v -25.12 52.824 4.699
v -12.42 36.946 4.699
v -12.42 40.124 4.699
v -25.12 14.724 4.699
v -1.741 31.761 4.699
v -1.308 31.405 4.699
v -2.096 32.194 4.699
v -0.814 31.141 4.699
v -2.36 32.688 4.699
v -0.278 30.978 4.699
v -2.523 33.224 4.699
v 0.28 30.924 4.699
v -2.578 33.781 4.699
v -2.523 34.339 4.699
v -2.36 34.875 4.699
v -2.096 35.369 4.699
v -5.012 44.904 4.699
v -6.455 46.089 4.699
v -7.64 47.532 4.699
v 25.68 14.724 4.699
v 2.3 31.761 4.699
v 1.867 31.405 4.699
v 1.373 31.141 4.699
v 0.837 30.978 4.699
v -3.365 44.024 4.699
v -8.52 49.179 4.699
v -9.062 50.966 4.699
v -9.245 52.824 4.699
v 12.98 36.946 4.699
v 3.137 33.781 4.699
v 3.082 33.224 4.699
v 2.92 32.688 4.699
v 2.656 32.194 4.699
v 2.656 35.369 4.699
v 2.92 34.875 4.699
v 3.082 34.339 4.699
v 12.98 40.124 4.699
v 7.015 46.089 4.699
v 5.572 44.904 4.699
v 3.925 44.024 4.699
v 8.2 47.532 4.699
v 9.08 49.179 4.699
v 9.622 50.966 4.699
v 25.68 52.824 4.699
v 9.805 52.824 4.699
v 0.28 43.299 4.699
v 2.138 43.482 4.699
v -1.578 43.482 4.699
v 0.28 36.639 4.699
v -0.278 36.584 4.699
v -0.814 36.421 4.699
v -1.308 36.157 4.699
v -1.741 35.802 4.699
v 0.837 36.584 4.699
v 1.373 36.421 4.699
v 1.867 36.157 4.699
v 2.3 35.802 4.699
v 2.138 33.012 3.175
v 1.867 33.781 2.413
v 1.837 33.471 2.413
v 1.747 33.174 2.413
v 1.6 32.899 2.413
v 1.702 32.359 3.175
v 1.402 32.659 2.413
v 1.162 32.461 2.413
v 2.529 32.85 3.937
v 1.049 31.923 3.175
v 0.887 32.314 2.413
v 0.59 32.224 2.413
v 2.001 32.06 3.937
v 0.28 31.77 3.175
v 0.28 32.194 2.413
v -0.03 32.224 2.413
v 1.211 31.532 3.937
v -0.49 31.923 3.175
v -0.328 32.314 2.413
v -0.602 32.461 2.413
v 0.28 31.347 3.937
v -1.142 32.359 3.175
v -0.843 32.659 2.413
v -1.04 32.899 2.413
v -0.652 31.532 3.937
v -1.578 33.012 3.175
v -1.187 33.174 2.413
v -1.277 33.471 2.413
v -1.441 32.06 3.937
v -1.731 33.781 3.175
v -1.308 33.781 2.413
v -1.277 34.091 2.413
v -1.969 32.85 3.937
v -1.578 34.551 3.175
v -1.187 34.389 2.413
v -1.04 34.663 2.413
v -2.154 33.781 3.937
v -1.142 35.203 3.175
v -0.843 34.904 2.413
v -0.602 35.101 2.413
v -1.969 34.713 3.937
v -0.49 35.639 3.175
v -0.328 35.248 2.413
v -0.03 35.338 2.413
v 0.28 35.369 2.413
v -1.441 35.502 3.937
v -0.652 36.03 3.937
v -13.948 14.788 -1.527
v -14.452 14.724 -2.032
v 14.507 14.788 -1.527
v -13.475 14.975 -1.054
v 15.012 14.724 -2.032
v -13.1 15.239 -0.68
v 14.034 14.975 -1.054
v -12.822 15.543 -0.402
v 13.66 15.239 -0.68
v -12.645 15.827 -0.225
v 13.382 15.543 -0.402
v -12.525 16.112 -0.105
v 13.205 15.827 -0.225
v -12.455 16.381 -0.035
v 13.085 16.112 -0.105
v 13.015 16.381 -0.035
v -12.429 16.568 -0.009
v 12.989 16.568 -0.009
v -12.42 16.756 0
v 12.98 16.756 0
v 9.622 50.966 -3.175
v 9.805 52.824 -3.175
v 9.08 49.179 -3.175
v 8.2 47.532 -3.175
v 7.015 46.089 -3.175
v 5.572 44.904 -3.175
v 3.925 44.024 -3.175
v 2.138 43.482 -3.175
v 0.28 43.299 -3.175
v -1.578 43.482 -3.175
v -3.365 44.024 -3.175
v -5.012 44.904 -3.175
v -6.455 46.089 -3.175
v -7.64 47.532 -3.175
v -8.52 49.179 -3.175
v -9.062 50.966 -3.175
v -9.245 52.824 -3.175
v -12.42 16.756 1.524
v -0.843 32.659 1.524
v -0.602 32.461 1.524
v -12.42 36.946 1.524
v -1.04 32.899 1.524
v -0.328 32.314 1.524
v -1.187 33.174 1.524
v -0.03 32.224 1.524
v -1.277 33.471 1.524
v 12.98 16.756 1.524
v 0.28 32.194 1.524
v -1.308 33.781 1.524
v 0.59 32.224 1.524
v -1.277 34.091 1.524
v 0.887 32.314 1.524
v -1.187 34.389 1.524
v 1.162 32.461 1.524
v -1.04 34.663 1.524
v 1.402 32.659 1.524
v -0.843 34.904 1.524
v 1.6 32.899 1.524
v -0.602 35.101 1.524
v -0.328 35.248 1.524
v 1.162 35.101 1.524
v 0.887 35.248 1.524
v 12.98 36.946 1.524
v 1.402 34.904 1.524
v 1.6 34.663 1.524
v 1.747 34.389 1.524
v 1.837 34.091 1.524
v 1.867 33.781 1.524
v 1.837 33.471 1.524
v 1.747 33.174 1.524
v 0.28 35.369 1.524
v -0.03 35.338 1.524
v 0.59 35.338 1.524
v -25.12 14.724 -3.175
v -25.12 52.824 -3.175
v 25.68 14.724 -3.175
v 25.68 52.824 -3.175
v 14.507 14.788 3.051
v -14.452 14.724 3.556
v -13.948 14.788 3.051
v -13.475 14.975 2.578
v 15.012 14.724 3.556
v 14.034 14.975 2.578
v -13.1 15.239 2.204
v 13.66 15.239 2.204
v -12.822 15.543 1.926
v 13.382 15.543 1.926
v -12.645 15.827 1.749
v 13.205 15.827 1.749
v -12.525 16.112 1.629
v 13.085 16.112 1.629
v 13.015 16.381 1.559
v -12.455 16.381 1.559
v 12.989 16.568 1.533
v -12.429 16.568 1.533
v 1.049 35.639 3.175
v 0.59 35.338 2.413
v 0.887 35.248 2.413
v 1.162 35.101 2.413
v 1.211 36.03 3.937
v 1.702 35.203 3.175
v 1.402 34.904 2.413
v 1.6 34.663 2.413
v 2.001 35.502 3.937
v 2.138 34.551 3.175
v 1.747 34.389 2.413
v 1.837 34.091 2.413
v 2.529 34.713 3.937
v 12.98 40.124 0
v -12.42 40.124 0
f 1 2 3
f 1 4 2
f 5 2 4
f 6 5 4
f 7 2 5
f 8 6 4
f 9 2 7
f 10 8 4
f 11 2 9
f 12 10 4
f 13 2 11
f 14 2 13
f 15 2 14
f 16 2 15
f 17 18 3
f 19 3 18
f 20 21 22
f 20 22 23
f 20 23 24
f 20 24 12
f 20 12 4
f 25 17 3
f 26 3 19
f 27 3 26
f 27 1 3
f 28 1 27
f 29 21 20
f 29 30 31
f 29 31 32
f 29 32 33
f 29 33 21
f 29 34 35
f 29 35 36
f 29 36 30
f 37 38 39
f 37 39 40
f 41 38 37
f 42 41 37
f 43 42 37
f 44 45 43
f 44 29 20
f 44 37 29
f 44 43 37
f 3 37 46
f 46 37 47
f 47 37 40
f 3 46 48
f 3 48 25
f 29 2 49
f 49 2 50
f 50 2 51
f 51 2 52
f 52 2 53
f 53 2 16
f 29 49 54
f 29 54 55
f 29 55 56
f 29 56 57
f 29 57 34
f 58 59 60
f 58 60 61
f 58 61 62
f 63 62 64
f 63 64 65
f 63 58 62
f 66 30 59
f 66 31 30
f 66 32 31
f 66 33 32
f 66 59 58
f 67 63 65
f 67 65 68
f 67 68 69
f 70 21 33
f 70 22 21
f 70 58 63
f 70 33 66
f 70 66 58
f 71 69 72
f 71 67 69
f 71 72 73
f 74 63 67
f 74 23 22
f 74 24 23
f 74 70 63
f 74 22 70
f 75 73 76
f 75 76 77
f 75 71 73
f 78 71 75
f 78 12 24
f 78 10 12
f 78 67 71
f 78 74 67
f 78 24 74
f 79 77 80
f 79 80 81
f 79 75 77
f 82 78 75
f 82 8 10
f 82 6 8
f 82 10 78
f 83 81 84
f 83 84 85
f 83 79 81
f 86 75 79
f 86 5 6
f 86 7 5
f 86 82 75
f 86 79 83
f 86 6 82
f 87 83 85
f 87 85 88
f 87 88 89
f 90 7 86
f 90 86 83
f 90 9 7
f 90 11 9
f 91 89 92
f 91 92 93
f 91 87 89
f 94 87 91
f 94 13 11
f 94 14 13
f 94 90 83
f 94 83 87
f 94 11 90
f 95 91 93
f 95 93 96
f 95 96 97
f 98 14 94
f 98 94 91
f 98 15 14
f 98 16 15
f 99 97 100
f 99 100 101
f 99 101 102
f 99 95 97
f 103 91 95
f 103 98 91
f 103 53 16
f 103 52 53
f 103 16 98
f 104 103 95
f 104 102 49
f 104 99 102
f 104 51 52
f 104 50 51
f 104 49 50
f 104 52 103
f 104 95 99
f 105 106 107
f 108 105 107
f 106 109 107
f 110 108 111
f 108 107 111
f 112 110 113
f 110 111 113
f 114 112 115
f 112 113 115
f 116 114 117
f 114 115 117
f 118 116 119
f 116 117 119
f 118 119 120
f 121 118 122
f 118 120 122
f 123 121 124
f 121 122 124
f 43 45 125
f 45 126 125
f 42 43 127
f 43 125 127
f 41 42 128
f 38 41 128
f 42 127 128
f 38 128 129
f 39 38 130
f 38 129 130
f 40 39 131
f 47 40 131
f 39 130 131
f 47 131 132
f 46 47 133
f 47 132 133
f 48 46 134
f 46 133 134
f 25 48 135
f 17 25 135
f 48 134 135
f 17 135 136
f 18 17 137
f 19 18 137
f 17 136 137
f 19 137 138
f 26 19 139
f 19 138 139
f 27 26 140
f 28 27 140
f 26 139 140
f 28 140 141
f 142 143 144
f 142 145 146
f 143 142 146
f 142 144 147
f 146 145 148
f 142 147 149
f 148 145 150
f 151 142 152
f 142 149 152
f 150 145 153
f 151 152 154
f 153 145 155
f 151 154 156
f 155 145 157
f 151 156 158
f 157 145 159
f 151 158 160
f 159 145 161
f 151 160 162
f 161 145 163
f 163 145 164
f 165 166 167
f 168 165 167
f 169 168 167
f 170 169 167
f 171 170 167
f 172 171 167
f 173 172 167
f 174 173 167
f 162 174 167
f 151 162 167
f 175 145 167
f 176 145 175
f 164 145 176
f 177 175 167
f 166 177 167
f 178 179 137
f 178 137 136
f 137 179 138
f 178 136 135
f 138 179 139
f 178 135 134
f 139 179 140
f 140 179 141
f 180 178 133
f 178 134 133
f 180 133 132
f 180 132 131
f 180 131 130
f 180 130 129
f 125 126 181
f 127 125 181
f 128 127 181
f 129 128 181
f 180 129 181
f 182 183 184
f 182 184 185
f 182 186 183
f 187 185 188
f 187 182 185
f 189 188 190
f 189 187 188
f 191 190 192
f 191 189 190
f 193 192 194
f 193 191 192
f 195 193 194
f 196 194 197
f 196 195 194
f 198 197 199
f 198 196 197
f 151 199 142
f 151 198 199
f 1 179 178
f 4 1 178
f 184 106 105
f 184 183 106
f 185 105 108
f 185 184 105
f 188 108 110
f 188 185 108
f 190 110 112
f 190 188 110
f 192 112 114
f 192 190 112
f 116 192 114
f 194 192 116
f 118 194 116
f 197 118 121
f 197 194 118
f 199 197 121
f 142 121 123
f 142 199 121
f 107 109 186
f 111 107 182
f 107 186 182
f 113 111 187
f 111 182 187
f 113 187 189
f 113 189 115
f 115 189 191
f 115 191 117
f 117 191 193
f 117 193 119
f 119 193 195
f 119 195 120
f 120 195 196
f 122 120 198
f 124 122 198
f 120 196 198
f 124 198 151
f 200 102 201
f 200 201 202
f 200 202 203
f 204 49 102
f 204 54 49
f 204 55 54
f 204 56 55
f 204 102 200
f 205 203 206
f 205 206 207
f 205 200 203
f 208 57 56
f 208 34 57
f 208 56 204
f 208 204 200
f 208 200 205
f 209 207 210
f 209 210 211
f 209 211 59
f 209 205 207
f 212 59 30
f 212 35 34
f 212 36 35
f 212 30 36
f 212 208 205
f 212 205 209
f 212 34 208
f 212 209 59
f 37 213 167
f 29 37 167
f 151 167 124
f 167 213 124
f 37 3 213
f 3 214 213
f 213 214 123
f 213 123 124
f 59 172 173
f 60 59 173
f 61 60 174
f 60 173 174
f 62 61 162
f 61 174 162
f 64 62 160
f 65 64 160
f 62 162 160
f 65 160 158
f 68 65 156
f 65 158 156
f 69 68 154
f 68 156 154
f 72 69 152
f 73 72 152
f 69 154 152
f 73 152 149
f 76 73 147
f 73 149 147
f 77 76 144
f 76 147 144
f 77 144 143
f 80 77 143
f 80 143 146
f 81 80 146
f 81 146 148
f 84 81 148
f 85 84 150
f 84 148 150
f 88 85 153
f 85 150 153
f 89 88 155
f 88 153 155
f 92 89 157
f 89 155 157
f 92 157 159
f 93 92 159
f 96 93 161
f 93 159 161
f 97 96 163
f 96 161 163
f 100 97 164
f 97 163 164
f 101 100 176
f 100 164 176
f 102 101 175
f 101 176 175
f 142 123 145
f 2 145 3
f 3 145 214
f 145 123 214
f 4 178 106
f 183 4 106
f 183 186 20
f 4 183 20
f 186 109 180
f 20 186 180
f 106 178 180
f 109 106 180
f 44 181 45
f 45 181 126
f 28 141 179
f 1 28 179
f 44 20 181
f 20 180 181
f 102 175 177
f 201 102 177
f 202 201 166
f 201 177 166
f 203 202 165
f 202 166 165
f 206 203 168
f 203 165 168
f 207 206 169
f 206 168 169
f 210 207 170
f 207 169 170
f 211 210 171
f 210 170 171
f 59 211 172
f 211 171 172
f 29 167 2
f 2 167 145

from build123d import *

# Parameters (mm, degrees)
F0_R     = 1.5875
F1_DEPTH = 3.175
F2_DEPTH = 1.524
F4_DEPTH = 3.175
F5_R     = 2.032
F6_SIZE2 = 1.27
F6_SIZE  = 2.286


with BuildPart() as f1:
    # F0 (on Top) → F1 (new body)
    with BuildSketch(Plane.XY):
        with BuildLine():
            Line((-9.6292242988, 40.124001728), (0.2798453521, 40.124001728))
            Line((0.2798453521, 40.124001728), (10.1889150029, 40.124001728))
            Line((10.1889150029, 40.124001728), (12.9798453521, 40.124001728))
            Line((12.9798453521, 40.124001728), (12.9798453521, 36.9588285685))
            Line((12.9798453521, 36.9588285685), (12.9798453521, 14.724001728))
            Line((12.9798453521, 14.724001728), (25.6798453521, 14.724001728))
            Line((25.6798453521, 14.724001728), (25.6798453521, 52.824001728))
            Line((25.6798453521, 52.824001728), (9.8048453521, 52.824001728))
            ThreePointArc((9.8048453521, 52.824001728), (0.2798453521, 43.299001728), (-9.2451546479, 52.824001728))
            Line((-9.2451546479, 52.824001728), (-25.1201546479, 52.824001728))
            Line((-25.1201546479, 52.824001728), (-25.1201546479, 14.724001728))
            Line((-25.1201546479, 14.724001728), (-12.4201546479, 14.724001728))
            Line((-12.4201546479, 14.724001728), (-12.4201546479, 36.9588285685))
            Line((-12.4201546479, 36.9588285685), (-12.4201546479, 40.124001728))
            Line((-12.4201546479, 40.124001728), (-9.6292242988, 40.124001728))
        make_face()
        Polygon((10.1889150029, 40.124001728), (0.2798453521, 40.124001728), (-9.6292242988, 40.124001728), (-12.4201546479, 40.124001728), (-12.4201546479, 36.9588285685), (-9.5826818713, 36.9588285685), (0.2798453521, 36.9588285685), (12.9798453521, 36.9588285685), (12.9798453521, 40.124001728), align=None)
        Polygon((12.9798453521, 14.724001728), (12.9798453521, 36.9588285685), (0.2798453521, 36.9588285685), (-9.5826818713, 36.9588285685), (-12.4201546479, 36.9588285685), (-12.4201546479, 14.724001728), align=None)
        with Locations((0.2798453521, 33.3929099143)):
            Circle(F0_R, mode=Mode.SUBTRACT)
        with Locations((0.2798453521, 33.3929099143)):
            Circle(F0_R)
    extrude(amount=-F1_DEPTH)

    # F0 (on Top) → F2 (join)
    with BuildSketch(Plane.XY):
        with BuildLine():
            Line((-9.6292242988, 40.124001728), (0.2798453521, 40.124001728))
            Line((0.2798453521, 40.124001728), (10.1889150029, 40.124001728))
            Line((10.1889150029, 40.124001728), (12.9798453521, 40.124001728))
            Line((12.9798453521, 40.124001728), (12.9798453521, 36.9588285685))
            Line((12.9798453521, 36.9588285685), (12.9798453521, 14.724001728))
            Line((12.9798453521, 14.724001728), (25.6798453521, 14.724001728))
            Line((25.6798453521, 14.724001728), (25.6798453521, 52.824001728))
            Line((25.6798453521, 52.824001728), (9.8048453521, 52.824001728))
            ThreePointArc((9.8048453521, 52.824001728), (0.2798453521, 43.299001728), (-9.2451546479, 52.824001728))
            Line((-9.2451546479, 52.824001728), (-25.1201546479, 52.824001728))
            Line((-25.1201546479, 52.824001728), (-25.1201546479, 14.724001728))
            Line((-25.1201546479, 14.724001728), (-12.4201546479, 14.724001728))
            Line((-12.4201546479, 14.724001728), (-12.4201546479, 36.9588285685))
            Line((-12.4201546479, 36.9588285685), (-12.4201546479, 40.124001728))
            Line((-12.4201546479, 40.124001728), (-9.6292242988, 40.124001728))
        make_face()
    extrude(amount=F2_DEPTH)

    # F3 (on face) → F4 (join)
    with BuildSketch(Plane.XY.offset(1.524)):
        with BuildLine():
            Line((-25.1201546479, 14.724001728), (-12.4201546479, 14.724001728))
            Line((-12.4201546479, 14.724001728), (-12.4201546479, 36.9455851614))
            Line((-12.4201546479, 36.9455851614), (-12.4201546479, 40.124001728))
            Line((-12.4201546479, 40.124001728), (0.2798453521, 40.124001728))
            Line((0.2798453521, 40.124001728), (12.9798453521, 40.124001728))
            Line((12.9798453521, 40.124001728), (12.9798453521, 36.9455851614))
            Line((12.9798453521, 36.9455851614), (12.9798453521, 14.724001728))
            Line((12.9798453521, 14.724001728), (25.6798453521, 14.724001728))
            Line((25.6798453521, 14.724001728), (25.6798453521, 52.824001728))
            Line((25.6798453521, 52.824001728), (9.8048453521, 52.824001728))
            ThreePointArc((9.8048453521, 52.824001728), (0.2798453521, 43.299001728), (-9.2451546479, 52.824001728))
            Line((-9.2451546479, 52.824001728), (-25.1201546479, 52.824001728))
            Line((-25.1201546479, 52.824001728), (-25.1201546479, 14.724001728))
        make_face()
        Polygon((-12.4201546479, 36.9455851614), (-12.4201546479, 14.724001728), (12.9798453521, 14.724001728), (12.9798453521, 36.9455851614), (0.2798453521, 36.9455851614), align=None)
        with BuildLine():
            ThreePointArc((1.8673453521, 33.7810702622), (-0.8426866631, 32.6585382471), (0.2798453521, 35.3685702622))
            ThreePointArc((0.2798453521, 35.3685702622), (1.4023773672, 34.9036022773), (1.8673453521, 33.7810702622))
        make_face(mode=Mode.SUBTRACT)
    extrude(amount=F4_DEPTH)

    # F5
    f5_edges = [f1.edges().sort_by_distance(p)[0] for p in [
        (0.279845, 14.724002, 1.524),
        (0.279845, 14.724002, 0),
        (-12.420155, 14.724002, 0.762),
        (12.979845, 14.724002, 0.762),
    ]]
    fillet(f5_edges, radius=F5_R)

    # F6
    f6_edges = [f1.edges().sort_by_distance(p)[0] for p in [
        (0.279845, 32.19357, 4.699),
    ]]
    f6_side = f1.faces().sort_by_distance((0.279845, 32.19357, 3.1115))[0]
    chamfer(f6_edges, length=F6_SIZE, length2=F6_SIZE2, reference=f6_side)


solid = f1.part
